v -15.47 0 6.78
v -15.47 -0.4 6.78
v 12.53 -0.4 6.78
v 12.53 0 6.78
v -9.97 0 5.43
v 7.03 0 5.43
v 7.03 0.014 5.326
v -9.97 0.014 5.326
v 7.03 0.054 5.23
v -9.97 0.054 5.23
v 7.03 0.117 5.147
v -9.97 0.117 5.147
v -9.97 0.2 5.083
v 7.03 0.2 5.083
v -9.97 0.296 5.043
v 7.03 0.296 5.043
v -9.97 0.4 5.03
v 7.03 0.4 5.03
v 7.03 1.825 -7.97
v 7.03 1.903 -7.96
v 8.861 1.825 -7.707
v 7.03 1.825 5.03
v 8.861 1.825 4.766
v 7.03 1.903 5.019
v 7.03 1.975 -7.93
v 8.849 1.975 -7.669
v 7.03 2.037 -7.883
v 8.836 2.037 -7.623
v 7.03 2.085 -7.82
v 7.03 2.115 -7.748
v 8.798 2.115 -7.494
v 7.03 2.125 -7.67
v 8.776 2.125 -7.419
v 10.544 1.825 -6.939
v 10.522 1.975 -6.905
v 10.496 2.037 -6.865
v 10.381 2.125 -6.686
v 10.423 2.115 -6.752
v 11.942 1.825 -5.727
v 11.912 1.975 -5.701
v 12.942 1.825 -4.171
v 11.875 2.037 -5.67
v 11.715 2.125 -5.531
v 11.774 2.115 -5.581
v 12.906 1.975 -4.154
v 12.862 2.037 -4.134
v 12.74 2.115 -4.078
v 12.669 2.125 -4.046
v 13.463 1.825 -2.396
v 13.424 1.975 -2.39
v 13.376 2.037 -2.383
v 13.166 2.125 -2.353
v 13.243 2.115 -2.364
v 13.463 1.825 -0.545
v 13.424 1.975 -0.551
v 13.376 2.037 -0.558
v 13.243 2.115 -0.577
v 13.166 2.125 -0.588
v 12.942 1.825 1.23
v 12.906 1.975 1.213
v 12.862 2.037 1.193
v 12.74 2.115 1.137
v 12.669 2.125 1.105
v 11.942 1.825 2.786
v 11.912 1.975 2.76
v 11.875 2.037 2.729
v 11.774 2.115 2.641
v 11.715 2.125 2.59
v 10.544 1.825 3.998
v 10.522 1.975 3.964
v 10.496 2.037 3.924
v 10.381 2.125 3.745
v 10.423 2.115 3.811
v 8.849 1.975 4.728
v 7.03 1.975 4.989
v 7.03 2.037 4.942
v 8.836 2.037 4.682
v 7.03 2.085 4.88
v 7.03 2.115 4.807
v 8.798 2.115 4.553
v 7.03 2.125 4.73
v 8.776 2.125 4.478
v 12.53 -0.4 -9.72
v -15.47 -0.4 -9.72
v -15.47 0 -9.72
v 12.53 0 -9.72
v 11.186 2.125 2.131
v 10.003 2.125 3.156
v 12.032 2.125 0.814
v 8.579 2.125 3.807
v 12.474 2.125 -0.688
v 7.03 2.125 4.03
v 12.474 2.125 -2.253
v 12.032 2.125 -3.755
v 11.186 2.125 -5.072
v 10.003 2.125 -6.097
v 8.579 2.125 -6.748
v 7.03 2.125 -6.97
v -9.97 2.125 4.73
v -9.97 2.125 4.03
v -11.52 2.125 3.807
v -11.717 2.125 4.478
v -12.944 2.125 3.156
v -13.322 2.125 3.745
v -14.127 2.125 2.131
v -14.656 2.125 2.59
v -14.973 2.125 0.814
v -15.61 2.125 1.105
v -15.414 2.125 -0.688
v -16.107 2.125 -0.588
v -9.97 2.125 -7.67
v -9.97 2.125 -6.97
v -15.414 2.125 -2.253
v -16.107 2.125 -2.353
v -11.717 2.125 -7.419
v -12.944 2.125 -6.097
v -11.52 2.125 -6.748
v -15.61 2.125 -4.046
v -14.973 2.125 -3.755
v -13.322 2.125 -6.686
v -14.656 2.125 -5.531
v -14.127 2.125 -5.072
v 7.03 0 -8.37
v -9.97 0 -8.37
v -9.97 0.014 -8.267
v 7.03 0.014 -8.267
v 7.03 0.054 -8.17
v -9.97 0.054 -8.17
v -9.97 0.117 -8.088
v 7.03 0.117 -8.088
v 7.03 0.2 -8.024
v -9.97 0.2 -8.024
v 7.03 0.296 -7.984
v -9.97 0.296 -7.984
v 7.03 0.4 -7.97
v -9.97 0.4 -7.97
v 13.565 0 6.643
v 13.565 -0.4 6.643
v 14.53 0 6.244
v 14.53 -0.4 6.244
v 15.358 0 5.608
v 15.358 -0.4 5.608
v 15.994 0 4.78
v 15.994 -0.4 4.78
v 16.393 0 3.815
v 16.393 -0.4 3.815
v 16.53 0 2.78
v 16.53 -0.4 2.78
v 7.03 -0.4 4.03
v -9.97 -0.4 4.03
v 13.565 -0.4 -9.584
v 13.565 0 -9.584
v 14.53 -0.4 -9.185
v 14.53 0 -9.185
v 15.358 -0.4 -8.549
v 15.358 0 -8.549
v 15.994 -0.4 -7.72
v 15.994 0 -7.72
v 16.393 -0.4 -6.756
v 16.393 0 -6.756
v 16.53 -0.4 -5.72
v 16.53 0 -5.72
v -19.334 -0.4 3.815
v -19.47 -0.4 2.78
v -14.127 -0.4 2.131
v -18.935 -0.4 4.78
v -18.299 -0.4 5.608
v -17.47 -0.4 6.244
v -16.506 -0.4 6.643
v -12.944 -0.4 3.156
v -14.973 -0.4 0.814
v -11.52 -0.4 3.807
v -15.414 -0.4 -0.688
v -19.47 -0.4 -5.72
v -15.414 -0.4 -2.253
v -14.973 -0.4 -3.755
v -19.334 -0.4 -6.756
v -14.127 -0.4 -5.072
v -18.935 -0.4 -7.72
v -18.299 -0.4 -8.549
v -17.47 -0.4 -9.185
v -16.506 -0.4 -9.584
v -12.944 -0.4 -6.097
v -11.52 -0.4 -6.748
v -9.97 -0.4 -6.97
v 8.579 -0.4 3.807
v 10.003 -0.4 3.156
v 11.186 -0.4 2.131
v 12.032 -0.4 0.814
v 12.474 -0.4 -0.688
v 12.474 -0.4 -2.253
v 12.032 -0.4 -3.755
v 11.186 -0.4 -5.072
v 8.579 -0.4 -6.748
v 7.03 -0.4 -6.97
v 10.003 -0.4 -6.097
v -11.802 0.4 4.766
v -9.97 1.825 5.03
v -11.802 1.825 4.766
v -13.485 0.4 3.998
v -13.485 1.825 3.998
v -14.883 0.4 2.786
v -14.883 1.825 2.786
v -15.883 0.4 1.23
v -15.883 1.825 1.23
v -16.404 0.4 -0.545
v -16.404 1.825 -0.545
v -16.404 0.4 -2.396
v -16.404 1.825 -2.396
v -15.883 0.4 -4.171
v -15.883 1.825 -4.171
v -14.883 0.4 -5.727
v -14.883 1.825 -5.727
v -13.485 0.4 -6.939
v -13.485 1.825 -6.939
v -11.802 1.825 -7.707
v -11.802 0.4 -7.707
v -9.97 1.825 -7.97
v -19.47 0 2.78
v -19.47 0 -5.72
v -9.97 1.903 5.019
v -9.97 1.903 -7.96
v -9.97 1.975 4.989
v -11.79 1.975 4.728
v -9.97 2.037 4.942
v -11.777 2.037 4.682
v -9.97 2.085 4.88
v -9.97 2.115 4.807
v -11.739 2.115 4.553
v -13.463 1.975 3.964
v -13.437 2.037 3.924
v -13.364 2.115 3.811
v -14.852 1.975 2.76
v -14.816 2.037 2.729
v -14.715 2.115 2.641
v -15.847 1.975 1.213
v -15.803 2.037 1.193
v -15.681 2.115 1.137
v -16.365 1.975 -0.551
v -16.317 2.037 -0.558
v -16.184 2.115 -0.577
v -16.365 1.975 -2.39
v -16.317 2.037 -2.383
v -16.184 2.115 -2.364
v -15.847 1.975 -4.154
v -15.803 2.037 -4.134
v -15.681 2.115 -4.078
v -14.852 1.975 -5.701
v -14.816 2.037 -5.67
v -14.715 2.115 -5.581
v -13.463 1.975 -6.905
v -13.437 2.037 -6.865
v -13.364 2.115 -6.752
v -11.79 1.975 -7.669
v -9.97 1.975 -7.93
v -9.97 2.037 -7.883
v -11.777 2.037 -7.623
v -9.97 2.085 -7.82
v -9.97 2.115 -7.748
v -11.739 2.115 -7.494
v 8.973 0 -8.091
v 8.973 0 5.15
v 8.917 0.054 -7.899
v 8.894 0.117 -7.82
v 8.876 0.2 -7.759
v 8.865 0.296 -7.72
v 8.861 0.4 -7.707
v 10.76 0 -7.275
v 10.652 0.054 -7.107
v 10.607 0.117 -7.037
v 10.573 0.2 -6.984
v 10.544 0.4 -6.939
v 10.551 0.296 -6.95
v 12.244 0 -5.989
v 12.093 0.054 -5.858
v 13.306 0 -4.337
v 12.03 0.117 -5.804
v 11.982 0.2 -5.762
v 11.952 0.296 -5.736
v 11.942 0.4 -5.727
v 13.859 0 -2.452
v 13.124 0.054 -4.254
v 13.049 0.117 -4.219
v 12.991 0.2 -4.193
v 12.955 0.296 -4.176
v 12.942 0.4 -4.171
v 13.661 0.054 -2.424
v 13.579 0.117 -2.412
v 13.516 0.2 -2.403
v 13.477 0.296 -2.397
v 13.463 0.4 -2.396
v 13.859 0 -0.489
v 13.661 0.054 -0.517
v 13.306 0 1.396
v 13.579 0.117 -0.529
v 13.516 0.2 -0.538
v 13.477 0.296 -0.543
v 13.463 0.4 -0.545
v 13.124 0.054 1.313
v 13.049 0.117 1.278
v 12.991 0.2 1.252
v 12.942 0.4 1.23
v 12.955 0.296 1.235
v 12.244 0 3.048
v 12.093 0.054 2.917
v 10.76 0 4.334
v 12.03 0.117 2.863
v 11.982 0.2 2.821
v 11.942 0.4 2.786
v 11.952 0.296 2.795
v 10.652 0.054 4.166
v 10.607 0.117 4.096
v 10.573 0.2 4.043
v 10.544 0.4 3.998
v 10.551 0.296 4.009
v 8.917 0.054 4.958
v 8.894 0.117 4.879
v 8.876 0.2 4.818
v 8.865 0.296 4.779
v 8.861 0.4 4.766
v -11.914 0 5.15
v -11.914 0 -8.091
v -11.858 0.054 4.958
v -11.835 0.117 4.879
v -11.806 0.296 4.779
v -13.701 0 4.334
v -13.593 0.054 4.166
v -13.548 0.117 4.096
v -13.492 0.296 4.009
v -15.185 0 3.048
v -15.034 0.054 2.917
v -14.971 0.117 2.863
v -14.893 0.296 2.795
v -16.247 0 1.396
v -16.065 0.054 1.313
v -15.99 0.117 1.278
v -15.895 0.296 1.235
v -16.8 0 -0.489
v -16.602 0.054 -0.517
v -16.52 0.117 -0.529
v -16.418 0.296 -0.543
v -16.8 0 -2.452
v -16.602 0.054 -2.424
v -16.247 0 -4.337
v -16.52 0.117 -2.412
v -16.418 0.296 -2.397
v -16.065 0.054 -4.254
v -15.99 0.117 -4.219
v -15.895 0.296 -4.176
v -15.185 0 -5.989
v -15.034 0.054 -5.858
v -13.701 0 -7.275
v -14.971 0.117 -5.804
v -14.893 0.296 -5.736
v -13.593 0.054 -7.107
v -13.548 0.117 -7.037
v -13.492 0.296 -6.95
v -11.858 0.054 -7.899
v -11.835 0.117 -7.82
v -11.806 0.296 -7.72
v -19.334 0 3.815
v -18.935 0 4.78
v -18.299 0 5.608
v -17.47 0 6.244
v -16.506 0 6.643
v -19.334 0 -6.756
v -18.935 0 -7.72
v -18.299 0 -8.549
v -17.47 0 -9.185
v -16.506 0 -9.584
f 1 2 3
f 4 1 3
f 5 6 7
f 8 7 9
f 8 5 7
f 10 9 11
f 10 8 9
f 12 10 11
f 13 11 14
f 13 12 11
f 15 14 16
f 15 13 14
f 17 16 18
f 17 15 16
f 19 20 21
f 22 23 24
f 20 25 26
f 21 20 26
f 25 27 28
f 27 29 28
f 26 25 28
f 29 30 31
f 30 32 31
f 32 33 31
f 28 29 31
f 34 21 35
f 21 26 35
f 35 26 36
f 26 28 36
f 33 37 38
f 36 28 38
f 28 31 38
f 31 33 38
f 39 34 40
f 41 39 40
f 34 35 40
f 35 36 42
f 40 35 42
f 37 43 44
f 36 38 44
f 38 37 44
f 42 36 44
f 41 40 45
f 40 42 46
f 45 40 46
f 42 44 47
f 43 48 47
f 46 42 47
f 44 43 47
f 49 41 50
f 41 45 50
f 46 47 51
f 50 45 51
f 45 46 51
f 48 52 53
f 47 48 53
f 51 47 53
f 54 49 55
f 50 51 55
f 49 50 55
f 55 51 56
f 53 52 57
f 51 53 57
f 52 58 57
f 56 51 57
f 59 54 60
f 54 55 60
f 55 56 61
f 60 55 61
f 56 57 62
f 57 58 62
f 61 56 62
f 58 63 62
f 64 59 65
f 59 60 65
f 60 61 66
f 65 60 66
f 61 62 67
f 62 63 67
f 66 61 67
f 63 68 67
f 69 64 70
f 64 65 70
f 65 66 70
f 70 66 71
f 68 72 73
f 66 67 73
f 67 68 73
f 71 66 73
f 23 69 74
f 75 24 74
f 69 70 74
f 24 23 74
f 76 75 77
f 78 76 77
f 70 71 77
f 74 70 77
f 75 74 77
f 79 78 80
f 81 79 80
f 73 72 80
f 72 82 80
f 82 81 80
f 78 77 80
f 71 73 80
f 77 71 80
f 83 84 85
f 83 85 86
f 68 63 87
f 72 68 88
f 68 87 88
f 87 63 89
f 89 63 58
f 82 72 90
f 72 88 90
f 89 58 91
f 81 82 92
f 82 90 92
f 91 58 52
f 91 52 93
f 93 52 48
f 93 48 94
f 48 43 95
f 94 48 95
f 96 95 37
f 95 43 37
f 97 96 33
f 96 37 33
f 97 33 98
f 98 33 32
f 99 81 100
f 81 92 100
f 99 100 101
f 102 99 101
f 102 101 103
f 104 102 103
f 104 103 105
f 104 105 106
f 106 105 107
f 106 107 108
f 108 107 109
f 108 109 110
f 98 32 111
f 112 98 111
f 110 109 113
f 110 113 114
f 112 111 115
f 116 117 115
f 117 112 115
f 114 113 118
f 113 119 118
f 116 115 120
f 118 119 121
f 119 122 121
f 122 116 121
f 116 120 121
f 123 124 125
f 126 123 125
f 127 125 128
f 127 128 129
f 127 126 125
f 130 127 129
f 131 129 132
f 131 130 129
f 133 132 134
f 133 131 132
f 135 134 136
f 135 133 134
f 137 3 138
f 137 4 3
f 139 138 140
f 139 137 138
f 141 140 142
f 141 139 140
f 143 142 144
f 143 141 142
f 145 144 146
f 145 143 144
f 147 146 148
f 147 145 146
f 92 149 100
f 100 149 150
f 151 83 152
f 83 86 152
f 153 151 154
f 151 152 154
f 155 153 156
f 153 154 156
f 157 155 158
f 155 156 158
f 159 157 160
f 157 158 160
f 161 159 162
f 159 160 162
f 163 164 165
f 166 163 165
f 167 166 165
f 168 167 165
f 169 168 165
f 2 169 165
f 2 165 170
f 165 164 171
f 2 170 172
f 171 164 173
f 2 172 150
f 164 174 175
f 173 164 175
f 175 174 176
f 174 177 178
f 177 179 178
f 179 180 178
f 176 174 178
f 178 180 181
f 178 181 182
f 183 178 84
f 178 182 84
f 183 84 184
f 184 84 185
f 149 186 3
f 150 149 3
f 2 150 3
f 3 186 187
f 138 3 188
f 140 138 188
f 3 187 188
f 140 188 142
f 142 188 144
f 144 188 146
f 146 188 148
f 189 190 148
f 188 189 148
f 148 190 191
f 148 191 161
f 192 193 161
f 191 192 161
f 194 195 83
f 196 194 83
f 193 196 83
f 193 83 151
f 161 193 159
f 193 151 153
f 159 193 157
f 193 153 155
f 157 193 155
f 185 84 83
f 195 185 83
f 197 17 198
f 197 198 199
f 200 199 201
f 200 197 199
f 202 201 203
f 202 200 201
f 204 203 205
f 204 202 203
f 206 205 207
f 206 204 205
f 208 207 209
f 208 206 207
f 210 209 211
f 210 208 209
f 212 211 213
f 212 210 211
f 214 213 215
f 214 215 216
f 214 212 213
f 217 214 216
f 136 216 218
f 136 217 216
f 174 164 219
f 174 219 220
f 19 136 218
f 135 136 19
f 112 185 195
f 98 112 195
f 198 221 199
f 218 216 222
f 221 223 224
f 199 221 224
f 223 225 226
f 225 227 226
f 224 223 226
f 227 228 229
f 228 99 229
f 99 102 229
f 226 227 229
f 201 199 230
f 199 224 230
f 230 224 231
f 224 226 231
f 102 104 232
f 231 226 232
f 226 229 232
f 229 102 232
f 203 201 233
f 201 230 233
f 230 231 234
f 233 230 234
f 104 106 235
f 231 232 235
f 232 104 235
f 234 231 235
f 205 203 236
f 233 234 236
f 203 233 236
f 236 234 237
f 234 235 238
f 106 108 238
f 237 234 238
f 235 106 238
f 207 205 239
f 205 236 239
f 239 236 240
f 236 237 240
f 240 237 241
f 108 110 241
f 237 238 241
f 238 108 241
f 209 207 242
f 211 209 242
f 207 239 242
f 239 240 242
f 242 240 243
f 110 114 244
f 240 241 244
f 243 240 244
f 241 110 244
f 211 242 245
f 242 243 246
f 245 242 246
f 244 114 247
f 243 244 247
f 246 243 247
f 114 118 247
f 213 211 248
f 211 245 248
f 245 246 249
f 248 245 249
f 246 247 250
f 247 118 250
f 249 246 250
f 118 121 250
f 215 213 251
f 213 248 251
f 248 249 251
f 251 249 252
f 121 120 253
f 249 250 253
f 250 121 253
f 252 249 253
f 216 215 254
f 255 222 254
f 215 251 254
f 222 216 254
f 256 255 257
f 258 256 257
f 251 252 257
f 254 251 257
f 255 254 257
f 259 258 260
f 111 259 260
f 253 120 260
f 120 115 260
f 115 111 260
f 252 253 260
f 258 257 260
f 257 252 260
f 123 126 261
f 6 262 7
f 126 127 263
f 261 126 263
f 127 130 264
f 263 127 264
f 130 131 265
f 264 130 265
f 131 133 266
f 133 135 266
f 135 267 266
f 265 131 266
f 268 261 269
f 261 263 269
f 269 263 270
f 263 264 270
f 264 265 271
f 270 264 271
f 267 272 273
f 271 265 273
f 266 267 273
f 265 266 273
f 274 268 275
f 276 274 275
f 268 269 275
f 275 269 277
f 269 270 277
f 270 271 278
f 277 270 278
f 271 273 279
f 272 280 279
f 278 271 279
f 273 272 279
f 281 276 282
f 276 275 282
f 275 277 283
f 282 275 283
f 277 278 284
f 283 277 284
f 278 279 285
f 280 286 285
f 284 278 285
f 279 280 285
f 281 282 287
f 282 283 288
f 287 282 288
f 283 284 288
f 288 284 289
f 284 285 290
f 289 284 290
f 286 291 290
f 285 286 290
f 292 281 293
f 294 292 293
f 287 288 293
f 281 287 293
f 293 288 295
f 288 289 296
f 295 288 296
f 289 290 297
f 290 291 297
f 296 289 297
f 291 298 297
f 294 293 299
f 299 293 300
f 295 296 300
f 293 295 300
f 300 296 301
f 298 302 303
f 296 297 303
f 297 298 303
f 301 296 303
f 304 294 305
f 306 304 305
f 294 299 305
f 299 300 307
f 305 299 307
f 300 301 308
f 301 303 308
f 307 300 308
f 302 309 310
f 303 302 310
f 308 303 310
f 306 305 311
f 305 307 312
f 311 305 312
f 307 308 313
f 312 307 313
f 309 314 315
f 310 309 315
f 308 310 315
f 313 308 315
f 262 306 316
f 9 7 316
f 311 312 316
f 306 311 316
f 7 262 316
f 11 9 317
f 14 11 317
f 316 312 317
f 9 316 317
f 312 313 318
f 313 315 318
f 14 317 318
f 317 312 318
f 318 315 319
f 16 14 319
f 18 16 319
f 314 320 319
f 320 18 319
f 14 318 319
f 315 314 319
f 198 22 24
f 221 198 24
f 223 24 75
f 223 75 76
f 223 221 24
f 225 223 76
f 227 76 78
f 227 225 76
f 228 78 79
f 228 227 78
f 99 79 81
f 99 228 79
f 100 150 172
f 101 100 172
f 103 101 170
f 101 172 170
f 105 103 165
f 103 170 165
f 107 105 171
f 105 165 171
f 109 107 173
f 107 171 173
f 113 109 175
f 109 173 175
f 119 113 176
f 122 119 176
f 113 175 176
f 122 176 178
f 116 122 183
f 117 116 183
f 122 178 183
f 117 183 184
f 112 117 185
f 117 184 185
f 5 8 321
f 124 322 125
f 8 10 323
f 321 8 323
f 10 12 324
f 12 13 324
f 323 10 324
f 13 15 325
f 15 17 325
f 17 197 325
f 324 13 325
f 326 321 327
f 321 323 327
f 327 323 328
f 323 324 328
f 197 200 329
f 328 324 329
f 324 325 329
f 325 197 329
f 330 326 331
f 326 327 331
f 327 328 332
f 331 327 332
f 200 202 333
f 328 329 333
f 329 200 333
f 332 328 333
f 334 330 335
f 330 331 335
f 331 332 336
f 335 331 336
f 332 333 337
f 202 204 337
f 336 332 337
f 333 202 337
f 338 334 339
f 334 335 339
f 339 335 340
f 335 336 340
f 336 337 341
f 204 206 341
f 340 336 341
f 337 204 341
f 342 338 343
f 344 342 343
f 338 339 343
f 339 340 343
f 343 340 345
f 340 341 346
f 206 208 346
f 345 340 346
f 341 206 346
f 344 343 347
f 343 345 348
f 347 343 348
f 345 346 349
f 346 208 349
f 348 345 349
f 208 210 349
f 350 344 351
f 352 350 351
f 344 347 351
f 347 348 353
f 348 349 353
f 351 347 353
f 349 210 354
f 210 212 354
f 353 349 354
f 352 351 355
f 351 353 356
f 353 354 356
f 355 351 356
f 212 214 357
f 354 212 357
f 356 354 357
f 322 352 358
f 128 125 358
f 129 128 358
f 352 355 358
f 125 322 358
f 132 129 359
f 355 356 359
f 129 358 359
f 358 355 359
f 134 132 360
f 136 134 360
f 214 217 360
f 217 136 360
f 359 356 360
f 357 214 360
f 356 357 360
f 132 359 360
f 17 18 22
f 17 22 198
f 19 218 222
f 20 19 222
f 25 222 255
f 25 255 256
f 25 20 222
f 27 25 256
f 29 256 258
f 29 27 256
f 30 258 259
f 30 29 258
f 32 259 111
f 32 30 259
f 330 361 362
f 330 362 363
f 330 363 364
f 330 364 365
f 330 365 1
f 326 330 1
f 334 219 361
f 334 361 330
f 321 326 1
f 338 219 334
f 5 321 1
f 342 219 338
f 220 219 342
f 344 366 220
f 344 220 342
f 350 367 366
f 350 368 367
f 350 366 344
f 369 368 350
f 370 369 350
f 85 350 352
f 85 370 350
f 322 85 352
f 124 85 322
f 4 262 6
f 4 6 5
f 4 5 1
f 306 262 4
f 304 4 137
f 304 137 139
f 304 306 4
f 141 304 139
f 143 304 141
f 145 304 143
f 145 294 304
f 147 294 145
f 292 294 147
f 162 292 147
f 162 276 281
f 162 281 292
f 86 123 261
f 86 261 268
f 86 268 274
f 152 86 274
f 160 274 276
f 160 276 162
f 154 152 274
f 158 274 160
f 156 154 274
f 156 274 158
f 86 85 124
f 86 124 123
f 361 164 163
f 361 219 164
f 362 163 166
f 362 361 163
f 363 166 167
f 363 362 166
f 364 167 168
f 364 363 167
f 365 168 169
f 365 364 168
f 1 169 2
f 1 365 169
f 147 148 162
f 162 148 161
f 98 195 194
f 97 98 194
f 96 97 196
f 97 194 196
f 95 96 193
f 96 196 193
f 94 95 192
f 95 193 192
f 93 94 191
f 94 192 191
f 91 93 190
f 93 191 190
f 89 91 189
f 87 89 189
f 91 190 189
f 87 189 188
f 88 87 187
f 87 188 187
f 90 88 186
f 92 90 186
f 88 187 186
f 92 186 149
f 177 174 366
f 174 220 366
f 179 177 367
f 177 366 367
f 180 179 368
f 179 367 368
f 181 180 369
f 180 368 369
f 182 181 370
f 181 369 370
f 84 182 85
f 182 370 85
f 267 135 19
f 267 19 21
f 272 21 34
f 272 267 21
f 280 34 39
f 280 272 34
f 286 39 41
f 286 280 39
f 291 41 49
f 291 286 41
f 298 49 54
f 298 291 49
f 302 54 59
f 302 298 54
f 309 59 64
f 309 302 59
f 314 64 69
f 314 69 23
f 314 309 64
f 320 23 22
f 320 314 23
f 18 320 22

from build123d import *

# Parameters (mm, degrees)
BOSS_EXTRUDE1_DEPTH     = 2.125
BOSS_EXTRUDE3_START     = -0.4
BOSS_EXTRUDE3_OUTLINE_W = 36
BOSS_EXTRUDE3_OUTLINE_H = 16.5
BOSS_EXTRUDE3_DEPTH     = 0.4
FILLET1_R               = 4
FILLET2_R               = 4
FILLET3_R               = 0.3
FILLET4_R               = 0.4


# Read off the part's stored shape, not the designer's step: Boss-Extrude3
with BuildPart() as part:
    # Sketch1 → Boss-Extrude1 (new body)
    with BuildSketch(Plane(origin=(0, 0, 0), x_dir=(1, 0, 0), z_dir=(0, 1, 0))):
        with BuildLine():
            Line((-9.970479705, 7.970479705), (7.029520295, 7.970479705))
            ThreePointArc((7.029520295, 7.970479705), (13.529520295, 1.470479705), (7.029520295, -5.029520295))
            Line((7.029520295, -5.029520295), (-9.970479705, -5.029520295))
            ThreePointArc((-9.970479705, -5.029520295), (-16.470479705, 1.470479705), (-9.970479705, 7.970479705))
        make_face()
        with BuildLine():
            Line((-9.970479705, 6.970479705), (7.029520295, 6.970479705))
            ThreePointArc((7.029520295, 6.970479705), (12.529520295, 1.470479705), (7.029520295, -4.029520295))
            Line((7.029520295, -4.029520295), (-9.970479705, -4.029520295))
            ThreePointArc((-9.970479705, -4.029520295), (-15.470479705, 1.470479705), (-9.970479705, 6.970479705))
        make_face(mode=Mode.SUBTRACT)
    extrude(amount=BOSS_EXTRUDE1_DEPTH)

    # Boss-Extrude3 outline → Boss-Extrude3 (add)
    with BuildSketch(Plane(origin=(0, 0, 0), x_dir=(1, 0, 0), z_dir=(0, 1, 0)).offset(BOSS_EXTRUDE3_START)):
        with Locations((-1.470479705, 1.470479705)):
            Rectangle(BOSS_EXTRUDE3_OUTLINE_W, BOSS_EXTRUDE3_OUTLINE_H)
        with BuildLine():
            Line((7.029520295, -4.029520295), (-9.970479705, -4.029520295))
            ThreePointArc((-9.970479705, -4.029520295), (-15.470479705, 1.470479705), (-9.970479705, 6.970479705))
            Line((-9.970479705, 6.970479705), (7.029520295, 6.970479705))
            ThreePointArc((7.029520295, 6.970479705), (12.529520295, 1.470479705), (7.029520295, -4.029520295))
        make_face(mode=Mode.SUBTRACT)
    extrude(amount=BOSS_EXTRUDE3_DEPTH)

    # Fillet1
    fillet1_edges = [part.edges().sort_by_distance(p)[0] for p in [
        (-19.470479705, -0.2, 6.779520295),
    ]]
    fillet(fillet1_edges, radius=FILLET1_R)

    # Fillet2
    fillet2_edges = [part.edges().sort_by_distance(p)[0] for p in [
        (16.529520295, -0.2, 6.779520295),
        (-19.470479705, -0.2, -9.720479705),
        (16.529520295, -0.2, -9.720479705),
    ]]
    fillet(fillet2_edges, radius=FILLET2_R)

    # Fillet3
    fillet3_edges = [part.edges().sort_by_distance(p)[0] for p in [
        (13.529520295, 2.125, -1.470479705),
        (-1.470479705, 2.125, -7.970479705),
        (-16.470479705, 2.125, -1.470479705),
        (-1.470479705, 2.125, 5.029520295),
    ]]
    fillet(fillet3_edges, radius=FILLET3_R)

    # Fillet4
    fillet4_edges = [part.edges().sort_by_distance(p)[0] for p in [
        (-1.470479705, 0, -7.970479705),
        (13.529520295, 0, -1.470479705),
        (-1.470479705, 0, 5.029520295),
        (-16.470479705, 0, -1.470479705),
    ]]
    fillet(fillet4_edges, radius=FILLET4_R)


solid = part.part
